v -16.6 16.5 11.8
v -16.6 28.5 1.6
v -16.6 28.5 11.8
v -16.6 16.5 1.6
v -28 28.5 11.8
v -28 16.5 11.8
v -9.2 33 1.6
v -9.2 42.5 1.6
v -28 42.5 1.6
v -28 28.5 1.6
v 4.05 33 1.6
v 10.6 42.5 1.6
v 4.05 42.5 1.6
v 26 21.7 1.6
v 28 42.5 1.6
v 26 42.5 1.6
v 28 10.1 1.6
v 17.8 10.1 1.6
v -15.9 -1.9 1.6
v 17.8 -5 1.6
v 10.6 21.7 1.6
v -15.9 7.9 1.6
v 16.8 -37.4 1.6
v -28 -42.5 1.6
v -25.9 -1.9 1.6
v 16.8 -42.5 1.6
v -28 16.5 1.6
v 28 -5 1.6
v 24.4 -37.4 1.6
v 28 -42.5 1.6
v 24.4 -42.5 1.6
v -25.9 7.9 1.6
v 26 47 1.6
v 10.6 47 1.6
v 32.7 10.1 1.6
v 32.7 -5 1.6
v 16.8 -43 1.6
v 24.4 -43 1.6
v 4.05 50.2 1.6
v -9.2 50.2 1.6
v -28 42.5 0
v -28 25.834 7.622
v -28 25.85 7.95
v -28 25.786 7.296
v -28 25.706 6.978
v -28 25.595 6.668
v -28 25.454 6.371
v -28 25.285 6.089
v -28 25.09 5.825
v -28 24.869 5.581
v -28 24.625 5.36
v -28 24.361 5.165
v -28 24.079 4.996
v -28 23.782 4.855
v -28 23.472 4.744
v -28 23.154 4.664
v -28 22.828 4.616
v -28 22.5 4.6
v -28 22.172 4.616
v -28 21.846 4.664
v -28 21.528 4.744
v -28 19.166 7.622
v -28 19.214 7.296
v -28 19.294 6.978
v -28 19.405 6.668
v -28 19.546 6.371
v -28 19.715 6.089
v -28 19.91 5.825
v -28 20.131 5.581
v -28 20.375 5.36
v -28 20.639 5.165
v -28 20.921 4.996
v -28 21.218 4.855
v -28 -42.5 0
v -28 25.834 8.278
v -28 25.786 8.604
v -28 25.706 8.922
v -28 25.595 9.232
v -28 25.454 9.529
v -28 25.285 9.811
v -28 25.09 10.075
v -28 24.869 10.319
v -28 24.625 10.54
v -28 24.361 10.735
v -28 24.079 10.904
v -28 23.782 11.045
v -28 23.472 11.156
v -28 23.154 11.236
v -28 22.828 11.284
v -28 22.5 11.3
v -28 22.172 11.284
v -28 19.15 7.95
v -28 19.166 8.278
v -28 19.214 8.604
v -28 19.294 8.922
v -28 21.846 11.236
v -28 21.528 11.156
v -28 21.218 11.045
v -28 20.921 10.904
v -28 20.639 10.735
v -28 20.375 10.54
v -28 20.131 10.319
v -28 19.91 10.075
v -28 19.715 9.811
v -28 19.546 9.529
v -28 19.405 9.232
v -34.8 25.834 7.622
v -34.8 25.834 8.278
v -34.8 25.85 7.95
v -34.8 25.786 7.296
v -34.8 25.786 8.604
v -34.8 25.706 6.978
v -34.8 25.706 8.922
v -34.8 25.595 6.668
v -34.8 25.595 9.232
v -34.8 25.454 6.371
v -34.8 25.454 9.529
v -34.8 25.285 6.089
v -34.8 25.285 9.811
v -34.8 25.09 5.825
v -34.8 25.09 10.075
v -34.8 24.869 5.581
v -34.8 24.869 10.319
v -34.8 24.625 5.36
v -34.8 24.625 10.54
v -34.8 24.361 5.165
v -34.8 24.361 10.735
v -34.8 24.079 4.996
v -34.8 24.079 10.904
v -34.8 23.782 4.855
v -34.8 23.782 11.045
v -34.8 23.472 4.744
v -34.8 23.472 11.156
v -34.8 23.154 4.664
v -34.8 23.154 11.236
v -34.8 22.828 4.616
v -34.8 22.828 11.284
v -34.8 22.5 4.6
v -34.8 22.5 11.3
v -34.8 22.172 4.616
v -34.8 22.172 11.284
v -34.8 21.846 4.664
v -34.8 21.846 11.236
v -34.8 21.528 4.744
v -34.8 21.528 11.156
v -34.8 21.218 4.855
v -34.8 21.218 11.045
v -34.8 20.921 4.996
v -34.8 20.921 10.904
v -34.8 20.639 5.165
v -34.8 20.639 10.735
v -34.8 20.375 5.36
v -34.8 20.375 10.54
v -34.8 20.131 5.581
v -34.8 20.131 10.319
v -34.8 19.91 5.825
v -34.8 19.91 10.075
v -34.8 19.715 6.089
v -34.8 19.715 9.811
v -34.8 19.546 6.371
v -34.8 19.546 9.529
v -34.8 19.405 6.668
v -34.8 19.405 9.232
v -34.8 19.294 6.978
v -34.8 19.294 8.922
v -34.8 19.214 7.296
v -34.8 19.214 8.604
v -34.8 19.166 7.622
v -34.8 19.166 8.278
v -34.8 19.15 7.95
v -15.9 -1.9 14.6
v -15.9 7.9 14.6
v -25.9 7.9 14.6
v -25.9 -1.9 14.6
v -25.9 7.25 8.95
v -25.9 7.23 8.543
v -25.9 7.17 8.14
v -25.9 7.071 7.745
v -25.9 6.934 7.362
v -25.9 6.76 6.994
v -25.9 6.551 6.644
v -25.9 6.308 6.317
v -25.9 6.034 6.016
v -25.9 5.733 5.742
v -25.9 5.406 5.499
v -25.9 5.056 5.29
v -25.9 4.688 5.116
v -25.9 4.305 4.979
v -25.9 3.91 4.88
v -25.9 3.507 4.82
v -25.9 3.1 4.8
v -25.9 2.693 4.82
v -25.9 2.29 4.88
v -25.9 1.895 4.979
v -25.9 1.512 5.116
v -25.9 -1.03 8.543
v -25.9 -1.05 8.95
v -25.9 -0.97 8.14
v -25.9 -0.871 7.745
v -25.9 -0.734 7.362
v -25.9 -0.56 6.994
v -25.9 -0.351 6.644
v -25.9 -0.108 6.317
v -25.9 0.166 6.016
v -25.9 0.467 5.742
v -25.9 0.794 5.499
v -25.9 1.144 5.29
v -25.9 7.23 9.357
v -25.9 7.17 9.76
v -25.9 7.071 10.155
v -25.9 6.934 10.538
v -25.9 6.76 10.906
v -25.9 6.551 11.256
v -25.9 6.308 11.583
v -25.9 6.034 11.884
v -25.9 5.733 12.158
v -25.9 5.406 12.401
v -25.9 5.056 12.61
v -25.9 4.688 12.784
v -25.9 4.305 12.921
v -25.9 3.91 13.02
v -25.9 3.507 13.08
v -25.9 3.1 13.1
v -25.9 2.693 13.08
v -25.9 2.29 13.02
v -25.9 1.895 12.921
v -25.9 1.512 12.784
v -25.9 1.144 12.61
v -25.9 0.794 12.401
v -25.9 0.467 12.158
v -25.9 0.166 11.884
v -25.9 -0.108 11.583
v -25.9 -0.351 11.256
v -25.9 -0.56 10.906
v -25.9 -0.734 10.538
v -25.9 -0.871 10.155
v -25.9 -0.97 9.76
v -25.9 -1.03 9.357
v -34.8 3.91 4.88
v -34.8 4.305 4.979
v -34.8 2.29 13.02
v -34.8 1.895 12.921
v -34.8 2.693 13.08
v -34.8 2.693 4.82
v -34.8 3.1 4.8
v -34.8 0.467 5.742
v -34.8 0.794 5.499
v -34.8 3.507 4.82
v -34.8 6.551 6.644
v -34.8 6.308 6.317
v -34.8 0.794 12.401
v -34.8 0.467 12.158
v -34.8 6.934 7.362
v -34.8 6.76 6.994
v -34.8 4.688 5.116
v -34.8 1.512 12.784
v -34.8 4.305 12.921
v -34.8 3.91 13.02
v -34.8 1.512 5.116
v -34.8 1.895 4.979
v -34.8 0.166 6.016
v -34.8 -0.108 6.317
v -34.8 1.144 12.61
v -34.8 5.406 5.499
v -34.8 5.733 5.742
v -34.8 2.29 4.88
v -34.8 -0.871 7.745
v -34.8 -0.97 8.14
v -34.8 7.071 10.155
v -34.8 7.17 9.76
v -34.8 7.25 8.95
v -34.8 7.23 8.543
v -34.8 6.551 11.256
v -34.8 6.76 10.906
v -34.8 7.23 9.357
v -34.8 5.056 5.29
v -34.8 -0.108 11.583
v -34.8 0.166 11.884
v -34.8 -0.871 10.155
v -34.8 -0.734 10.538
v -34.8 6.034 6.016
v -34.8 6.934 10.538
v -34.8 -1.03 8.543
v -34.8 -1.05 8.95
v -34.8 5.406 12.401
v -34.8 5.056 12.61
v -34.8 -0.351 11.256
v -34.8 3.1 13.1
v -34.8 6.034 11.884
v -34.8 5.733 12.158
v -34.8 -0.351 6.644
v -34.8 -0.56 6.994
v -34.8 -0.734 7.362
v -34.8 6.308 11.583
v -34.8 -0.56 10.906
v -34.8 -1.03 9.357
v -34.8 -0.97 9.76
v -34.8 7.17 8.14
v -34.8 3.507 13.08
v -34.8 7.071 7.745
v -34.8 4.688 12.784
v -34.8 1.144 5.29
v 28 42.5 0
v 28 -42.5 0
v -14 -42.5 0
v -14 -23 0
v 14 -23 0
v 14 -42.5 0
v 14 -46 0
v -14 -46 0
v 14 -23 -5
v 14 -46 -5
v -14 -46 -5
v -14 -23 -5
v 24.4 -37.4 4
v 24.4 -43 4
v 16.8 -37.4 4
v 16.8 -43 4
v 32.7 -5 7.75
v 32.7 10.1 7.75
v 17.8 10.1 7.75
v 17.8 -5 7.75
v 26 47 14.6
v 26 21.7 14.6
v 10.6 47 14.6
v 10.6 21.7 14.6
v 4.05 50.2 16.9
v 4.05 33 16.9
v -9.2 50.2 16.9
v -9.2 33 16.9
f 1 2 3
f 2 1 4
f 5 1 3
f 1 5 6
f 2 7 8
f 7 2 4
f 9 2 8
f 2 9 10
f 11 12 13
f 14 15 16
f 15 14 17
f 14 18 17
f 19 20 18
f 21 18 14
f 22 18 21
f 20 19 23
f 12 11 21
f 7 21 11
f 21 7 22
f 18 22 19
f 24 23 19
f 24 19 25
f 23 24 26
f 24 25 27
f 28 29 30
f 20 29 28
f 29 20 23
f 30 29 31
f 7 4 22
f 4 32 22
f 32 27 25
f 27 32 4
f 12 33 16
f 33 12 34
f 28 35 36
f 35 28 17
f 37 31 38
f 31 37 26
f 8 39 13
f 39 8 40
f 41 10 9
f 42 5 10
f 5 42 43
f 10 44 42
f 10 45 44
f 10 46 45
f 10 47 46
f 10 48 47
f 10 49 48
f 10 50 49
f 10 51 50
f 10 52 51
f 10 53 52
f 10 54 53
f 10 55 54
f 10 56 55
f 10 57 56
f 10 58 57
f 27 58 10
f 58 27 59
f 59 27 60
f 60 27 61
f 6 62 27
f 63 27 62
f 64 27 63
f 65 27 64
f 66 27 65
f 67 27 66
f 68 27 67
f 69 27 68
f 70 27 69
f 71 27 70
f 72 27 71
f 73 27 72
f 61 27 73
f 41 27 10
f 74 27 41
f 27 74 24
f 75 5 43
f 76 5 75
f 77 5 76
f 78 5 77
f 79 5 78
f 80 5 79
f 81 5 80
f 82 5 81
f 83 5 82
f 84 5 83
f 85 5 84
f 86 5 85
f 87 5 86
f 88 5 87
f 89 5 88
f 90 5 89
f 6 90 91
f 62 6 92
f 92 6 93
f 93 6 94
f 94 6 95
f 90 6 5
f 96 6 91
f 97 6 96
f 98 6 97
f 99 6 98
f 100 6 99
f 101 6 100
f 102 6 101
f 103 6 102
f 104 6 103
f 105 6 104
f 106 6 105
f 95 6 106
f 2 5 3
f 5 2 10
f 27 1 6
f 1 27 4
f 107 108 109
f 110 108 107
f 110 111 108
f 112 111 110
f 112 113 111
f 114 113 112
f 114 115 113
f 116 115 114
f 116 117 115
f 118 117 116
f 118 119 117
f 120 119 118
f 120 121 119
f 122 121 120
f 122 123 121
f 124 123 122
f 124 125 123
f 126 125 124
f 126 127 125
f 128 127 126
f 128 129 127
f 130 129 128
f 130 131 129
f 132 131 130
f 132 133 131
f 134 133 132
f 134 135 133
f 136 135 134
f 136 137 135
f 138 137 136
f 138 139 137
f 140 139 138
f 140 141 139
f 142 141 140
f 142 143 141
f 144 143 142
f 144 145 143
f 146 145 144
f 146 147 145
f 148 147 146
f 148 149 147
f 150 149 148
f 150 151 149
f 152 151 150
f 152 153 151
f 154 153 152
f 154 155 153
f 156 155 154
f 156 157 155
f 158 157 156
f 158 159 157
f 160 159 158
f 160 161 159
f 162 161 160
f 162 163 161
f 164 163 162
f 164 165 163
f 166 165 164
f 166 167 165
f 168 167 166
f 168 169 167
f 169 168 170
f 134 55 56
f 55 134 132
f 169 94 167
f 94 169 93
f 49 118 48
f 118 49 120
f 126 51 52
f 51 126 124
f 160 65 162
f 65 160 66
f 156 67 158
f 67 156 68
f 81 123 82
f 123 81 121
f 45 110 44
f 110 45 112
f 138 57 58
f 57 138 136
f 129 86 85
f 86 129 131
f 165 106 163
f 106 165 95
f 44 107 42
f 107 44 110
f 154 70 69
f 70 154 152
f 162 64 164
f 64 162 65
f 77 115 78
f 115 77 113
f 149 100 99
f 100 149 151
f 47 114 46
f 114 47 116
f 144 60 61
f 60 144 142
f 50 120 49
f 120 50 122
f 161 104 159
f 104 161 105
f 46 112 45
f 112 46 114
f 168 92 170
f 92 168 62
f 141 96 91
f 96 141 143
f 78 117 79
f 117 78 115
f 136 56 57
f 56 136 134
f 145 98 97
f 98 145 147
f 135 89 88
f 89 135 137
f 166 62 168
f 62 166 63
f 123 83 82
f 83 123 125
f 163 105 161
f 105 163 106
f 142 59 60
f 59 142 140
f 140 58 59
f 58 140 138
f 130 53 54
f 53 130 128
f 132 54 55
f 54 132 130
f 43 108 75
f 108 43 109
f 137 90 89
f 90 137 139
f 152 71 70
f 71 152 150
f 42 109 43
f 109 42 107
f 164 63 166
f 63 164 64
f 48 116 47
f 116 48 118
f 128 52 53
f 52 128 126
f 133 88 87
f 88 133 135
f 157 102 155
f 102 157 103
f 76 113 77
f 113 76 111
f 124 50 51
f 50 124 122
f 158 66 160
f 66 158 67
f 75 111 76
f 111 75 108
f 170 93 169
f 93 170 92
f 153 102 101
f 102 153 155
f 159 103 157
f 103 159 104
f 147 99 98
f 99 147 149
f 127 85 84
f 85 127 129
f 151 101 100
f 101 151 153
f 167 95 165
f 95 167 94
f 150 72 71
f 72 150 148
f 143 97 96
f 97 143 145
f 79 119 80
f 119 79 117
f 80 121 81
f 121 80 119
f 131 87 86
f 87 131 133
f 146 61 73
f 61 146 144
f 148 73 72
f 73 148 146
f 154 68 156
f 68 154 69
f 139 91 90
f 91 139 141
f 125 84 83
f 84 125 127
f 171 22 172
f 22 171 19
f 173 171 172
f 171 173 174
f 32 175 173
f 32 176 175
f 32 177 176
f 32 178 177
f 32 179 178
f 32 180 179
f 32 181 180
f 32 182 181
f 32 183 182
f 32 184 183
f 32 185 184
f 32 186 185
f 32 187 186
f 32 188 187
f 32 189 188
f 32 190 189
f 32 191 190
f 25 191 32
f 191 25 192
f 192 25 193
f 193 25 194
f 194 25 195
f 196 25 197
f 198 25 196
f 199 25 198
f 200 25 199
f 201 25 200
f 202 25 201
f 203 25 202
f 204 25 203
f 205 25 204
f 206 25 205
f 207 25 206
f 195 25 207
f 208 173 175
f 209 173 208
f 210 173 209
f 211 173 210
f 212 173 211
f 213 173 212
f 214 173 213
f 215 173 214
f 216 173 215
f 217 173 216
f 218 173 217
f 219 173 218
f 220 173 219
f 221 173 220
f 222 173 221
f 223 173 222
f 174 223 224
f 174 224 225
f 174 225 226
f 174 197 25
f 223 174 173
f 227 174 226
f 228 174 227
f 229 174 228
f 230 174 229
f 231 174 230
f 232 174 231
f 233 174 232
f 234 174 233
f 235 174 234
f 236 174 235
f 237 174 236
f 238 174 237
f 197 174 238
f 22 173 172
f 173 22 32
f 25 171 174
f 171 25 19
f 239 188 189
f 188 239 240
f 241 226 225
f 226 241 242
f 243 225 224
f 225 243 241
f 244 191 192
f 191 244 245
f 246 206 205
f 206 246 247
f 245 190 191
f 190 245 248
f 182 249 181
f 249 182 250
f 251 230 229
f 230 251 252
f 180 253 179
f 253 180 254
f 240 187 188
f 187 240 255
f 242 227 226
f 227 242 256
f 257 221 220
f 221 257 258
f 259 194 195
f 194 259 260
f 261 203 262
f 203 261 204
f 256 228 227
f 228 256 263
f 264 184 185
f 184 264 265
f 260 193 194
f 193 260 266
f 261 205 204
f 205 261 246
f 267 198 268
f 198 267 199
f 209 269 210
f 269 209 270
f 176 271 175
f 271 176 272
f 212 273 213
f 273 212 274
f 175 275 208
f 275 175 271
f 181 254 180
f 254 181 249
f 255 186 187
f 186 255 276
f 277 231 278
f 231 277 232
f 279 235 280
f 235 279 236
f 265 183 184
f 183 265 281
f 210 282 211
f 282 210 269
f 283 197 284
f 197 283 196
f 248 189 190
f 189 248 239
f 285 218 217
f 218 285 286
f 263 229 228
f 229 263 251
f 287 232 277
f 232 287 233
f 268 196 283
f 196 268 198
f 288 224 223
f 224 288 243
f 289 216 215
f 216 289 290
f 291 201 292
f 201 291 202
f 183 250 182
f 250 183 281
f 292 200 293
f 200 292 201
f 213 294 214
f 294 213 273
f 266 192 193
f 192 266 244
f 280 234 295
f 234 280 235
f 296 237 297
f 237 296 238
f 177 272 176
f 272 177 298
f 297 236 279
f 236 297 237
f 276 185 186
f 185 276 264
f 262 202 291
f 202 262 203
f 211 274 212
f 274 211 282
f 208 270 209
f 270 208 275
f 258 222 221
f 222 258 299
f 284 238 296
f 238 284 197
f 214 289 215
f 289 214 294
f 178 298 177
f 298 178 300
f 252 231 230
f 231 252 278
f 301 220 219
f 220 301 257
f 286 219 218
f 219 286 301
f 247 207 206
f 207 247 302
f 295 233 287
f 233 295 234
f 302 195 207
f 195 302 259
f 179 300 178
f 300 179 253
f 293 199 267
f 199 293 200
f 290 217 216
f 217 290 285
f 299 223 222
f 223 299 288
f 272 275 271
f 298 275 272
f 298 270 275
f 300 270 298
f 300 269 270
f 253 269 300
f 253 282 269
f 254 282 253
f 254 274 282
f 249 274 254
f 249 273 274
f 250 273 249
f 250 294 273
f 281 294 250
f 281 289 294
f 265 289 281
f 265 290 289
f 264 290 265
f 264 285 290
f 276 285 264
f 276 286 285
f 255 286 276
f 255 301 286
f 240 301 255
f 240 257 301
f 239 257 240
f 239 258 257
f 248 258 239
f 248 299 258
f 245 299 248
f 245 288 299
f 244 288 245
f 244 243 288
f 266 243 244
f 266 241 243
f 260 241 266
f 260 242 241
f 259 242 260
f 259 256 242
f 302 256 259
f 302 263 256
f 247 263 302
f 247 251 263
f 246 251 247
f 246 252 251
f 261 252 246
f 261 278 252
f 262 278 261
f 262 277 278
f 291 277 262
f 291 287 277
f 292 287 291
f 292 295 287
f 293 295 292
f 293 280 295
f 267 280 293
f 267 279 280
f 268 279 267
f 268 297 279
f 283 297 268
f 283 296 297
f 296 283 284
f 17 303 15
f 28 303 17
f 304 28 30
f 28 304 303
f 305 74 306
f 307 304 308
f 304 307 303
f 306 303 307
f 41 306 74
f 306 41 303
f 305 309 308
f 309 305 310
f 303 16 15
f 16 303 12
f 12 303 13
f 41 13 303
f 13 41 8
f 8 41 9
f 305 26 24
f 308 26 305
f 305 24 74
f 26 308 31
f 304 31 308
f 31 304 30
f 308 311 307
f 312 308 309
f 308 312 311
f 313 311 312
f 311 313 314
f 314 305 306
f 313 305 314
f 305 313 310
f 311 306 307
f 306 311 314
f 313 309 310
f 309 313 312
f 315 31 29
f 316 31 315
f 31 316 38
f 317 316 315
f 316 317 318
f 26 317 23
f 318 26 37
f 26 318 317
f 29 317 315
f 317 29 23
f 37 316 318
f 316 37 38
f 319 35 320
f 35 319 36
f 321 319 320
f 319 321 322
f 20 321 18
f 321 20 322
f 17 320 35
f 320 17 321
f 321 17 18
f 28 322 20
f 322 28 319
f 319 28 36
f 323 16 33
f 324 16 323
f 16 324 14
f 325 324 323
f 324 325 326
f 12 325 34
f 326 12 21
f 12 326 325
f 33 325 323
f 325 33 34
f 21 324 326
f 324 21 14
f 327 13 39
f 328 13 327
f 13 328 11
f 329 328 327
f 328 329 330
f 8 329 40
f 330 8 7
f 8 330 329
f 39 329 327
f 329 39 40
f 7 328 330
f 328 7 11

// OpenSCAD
$fn=64;
translate([-28,-42.5,0])color("green")cube([56,85,1.6]); //Hollow body
translate([-14,-46,-5])color("black")cube([28,23,5]); //SDCard
translate([56/2-3.6-7.6,-85/2-.5,1.6])color("silver")cube([7.6,5.6,2.4]);//Power port
translate([56/2-11.4+1.2,-85/2+37.5,1.6])color("silver")cube([11.4+3.5,15.1,6.15]); //HDMI Port
translate([56/2-2-15.4,85/2-21.8+1,1.6])color("silver")cube([15.4,21.8+3.5,13]); //Ethernet port
translate([-56/2+18.8,85/2-17.2+7.7,1.6])color("silver")cube([13.25,17.2,15.3]); //USB Port
union(){
    translate([-56/2,85/2-12-14,1.6])color("LightBlue")cube([11.4,12,10.2]);
    translate([-56/2-3.3-3.5,85/2-12-14+6,1.6+3+3.35])rotate([0,90,0])color("LightBlue")cylinder(h=3.4+3.5,r=3.35);
}// Headphone jack
union(){
    translate([-56/2+2.1,-85/2+40.6,1.6])color("yellow")cube([10.0,9.8,13]);
    translate([-56/2-3.3-3.5,-85/2+40.6+5,1.6+4+3.35])rotate([0,90,0])color("silver")cylinder(h=5.4+3.5,r=4.15);
}// Video jack
